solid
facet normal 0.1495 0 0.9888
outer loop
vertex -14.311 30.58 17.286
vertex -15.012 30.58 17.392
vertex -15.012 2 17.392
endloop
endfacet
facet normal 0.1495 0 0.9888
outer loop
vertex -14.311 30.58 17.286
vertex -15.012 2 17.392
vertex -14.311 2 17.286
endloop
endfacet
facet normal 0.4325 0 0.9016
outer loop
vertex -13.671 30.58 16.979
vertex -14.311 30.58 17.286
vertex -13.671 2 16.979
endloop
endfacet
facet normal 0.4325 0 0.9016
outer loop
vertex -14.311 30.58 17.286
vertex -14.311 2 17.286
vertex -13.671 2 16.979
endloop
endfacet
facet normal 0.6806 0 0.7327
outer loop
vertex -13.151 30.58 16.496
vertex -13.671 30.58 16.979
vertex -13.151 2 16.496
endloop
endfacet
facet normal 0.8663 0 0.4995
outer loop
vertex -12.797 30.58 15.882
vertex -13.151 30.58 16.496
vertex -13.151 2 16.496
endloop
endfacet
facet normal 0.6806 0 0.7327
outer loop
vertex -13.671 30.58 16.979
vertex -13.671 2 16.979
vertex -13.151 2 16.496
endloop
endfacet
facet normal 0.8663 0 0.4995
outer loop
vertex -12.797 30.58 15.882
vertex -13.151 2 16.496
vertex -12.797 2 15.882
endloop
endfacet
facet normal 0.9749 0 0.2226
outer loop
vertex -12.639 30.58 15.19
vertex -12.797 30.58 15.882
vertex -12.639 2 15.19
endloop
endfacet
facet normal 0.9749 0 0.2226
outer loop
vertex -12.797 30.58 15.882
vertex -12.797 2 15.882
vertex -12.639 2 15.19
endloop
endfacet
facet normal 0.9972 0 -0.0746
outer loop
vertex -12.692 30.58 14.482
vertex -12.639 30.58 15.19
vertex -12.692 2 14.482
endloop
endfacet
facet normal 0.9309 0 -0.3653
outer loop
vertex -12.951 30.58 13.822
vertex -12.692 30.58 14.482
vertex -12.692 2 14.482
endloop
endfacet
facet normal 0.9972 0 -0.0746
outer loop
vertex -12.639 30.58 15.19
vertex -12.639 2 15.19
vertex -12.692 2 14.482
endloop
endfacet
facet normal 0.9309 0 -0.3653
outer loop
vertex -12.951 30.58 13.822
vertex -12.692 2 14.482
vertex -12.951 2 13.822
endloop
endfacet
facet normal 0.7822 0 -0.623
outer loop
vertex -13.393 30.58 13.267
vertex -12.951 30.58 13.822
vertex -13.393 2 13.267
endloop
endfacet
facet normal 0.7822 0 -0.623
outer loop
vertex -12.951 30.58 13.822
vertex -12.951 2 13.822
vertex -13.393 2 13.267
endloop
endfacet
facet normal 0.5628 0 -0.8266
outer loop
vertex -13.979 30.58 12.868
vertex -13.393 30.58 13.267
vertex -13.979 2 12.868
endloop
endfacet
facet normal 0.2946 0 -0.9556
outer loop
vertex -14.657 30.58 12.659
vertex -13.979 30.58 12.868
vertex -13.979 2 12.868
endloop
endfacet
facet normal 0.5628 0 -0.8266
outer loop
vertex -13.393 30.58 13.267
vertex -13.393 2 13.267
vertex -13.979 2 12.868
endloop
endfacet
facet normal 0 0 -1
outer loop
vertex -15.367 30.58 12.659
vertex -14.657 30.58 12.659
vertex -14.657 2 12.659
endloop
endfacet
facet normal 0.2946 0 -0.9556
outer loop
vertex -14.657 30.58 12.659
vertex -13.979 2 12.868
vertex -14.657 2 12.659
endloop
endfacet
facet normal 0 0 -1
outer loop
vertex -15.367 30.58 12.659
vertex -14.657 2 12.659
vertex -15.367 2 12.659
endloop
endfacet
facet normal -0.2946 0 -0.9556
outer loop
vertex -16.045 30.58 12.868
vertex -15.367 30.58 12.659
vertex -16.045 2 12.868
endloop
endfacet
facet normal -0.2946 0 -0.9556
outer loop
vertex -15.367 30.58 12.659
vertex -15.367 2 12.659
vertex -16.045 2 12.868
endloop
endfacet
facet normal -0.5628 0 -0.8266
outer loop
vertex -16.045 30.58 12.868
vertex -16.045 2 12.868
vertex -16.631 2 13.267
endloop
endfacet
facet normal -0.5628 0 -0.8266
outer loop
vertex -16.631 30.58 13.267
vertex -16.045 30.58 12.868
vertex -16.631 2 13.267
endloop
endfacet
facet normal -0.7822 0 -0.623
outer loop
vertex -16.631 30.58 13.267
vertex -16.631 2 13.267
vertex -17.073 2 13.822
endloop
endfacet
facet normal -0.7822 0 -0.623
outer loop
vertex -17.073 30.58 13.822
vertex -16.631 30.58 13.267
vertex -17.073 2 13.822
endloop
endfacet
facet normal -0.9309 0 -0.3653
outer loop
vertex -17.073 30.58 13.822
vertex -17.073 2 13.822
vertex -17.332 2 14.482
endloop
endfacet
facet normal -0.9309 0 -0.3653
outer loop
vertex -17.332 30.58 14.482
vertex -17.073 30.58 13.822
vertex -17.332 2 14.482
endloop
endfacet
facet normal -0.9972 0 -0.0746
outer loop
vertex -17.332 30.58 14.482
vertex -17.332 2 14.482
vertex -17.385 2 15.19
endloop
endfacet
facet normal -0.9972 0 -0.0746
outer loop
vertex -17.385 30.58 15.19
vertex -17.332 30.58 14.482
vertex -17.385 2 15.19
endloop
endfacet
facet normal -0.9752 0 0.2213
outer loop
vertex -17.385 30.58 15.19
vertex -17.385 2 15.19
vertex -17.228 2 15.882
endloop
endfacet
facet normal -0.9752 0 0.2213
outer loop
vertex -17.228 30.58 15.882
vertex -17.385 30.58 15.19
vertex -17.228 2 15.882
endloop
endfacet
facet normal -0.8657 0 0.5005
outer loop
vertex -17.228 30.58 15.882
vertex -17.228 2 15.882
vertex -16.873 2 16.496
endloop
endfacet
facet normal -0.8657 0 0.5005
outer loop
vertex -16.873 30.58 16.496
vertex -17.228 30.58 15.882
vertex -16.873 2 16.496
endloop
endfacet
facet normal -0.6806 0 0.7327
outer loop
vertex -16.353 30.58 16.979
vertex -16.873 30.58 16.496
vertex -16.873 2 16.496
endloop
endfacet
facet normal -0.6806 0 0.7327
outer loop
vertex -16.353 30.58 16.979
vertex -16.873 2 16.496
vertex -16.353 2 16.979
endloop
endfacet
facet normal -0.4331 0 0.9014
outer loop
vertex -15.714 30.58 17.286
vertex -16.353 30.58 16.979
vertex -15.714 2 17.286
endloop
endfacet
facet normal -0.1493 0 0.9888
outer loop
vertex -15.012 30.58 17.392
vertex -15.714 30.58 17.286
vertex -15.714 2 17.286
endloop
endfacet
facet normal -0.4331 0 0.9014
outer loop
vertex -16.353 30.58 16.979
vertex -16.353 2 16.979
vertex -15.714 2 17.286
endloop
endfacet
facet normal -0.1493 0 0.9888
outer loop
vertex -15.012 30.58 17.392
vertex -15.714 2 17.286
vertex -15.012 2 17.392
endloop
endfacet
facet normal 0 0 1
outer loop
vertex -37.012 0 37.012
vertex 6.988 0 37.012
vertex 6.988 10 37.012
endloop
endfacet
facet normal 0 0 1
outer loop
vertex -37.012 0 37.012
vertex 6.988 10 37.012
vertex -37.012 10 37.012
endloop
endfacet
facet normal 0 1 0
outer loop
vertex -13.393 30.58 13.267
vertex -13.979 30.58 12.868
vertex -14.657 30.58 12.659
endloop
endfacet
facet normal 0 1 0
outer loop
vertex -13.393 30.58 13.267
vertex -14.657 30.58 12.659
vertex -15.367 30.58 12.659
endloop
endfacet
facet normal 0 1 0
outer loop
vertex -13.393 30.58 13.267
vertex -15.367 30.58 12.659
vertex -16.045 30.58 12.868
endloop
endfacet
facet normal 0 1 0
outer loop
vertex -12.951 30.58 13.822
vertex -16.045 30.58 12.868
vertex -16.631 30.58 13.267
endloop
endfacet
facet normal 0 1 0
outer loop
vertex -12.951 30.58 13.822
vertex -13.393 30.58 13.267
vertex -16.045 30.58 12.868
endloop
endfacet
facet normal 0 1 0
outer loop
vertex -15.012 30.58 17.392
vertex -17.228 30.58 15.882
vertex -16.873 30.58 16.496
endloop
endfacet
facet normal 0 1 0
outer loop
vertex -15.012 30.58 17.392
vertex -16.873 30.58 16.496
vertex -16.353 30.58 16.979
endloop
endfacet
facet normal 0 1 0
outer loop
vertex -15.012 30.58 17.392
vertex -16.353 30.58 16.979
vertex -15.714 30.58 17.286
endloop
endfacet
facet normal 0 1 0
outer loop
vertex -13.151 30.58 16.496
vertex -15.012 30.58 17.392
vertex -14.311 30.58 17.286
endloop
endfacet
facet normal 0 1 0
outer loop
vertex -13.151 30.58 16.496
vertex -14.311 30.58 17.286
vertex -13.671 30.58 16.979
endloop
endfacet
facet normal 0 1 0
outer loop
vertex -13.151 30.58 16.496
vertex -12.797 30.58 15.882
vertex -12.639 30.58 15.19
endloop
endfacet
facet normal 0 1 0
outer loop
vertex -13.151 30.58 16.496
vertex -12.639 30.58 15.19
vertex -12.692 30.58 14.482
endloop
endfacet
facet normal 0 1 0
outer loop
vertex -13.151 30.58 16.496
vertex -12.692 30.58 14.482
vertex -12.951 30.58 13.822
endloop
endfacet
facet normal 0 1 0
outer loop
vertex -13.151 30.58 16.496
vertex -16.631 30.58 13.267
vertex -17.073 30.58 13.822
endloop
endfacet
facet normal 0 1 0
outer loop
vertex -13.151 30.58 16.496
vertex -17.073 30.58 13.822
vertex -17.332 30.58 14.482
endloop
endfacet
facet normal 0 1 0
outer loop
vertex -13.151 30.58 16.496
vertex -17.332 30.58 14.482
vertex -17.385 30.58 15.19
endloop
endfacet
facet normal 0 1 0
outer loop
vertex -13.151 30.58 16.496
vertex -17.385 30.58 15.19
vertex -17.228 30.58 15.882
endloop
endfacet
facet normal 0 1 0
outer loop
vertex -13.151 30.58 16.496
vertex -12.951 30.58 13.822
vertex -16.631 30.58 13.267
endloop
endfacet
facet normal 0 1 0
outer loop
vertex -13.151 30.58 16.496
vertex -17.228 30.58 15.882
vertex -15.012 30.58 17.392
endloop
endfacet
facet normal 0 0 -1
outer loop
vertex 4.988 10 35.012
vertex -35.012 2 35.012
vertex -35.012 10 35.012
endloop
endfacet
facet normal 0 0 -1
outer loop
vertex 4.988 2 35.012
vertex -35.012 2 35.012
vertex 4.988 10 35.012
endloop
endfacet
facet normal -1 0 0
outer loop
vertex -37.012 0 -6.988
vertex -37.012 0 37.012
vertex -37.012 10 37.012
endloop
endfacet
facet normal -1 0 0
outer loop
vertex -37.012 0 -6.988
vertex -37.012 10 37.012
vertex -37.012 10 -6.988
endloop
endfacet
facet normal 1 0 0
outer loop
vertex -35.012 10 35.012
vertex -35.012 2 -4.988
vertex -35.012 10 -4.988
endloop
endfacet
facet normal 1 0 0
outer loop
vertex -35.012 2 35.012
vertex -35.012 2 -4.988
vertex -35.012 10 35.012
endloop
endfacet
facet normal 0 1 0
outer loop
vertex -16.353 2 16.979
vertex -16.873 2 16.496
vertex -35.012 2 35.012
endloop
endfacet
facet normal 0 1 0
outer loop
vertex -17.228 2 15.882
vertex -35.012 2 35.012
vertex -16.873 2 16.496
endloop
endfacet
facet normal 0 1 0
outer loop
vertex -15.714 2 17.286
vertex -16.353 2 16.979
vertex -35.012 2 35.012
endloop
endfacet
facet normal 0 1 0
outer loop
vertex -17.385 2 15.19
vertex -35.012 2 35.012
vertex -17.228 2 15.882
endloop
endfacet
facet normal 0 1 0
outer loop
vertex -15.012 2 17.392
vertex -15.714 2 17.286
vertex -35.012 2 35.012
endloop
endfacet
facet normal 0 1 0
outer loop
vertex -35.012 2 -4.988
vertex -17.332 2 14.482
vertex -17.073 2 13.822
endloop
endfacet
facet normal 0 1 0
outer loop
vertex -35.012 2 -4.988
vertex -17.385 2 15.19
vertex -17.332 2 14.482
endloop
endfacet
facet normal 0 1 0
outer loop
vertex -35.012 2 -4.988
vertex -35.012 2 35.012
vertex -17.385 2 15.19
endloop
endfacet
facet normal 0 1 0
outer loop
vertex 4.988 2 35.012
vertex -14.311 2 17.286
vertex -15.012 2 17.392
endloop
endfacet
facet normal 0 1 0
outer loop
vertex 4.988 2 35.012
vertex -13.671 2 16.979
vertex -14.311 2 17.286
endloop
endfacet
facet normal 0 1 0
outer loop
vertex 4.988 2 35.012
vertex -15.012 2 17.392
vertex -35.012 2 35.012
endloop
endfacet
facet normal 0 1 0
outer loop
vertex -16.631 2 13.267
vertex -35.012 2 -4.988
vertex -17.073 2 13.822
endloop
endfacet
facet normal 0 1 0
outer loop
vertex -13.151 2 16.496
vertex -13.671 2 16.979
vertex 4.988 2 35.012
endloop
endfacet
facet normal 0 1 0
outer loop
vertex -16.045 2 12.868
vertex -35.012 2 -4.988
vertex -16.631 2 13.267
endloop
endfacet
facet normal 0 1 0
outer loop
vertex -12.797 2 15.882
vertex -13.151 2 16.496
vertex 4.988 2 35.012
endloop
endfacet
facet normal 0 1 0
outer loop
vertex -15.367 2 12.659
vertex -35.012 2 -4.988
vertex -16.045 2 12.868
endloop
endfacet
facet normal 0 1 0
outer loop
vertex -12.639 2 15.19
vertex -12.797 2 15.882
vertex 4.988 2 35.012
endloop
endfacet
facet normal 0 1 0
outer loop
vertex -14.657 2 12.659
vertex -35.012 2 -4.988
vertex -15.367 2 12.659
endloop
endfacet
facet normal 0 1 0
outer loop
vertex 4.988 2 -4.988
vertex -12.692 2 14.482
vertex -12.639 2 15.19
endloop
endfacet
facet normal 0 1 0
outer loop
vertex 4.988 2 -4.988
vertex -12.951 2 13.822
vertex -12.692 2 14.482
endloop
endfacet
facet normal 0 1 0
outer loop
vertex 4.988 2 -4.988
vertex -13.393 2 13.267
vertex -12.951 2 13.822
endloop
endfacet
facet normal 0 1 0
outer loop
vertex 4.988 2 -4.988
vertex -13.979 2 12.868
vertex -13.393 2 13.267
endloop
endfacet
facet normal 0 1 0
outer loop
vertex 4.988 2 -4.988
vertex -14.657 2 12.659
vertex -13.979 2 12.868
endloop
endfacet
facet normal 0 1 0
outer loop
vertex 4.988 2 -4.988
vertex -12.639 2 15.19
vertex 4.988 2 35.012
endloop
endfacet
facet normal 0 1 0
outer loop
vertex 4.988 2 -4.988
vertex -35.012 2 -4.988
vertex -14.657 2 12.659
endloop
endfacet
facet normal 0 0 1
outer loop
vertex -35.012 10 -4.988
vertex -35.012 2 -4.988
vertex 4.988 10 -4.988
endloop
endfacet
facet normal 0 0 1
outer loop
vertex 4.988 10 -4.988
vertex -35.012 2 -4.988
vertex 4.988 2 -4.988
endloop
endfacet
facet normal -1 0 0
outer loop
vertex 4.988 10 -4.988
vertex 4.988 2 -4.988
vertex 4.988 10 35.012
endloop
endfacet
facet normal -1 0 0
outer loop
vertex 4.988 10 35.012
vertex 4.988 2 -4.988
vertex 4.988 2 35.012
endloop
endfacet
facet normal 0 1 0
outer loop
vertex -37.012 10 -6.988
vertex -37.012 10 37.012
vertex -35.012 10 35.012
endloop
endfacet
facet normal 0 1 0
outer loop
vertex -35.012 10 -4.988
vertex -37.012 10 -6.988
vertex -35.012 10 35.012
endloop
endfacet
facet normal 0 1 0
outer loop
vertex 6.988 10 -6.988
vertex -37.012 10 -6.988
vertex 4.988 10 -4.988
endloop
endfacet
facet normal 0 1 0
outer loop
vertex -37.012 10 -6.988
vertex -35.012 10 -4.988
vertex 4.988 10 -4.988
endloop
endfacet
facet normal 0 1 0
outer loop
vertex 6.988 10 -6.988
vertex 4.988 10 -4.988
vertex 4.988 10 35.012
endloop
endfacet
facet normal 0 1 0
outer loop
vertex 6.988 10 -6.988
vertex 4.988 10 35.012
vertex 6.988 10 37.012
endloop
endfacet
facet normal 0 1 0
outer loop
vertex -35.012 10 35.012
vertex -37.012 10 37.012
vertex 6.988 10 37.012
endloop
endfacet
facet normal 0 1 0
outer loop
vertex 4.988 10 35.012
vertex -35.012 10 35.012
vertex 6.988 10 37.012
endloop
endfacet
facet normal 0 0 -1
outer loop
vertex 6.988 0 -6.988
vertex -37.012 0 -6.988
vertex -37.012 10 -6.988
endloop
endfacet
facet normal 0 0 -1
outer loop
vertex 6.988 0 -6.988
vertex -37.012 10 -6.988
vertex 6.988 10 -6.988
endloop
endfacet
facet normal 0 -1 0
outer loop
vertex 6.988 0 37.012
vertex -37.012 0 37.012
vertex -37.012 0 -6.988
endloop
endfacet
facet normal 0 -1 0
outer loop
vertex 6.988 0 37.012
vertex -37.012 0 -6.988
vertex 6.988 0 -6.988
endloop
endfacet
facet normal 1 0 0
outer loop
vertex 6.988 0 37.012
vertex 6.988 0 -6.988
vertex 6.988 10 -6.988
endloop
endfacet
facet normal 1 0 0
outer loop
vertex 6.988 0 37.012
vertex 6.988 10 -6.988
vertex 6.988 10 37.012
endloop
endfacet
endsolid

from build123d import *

# Parameters (mm, degrees)
ESBO_O1_W                = 40
ESBO_O1_H                = 40
RESSALTO_EXTRUS_O1_DEPTH = 2
ESBO_O2_W                = 40
ESBO_O2_H                = 40
RESSALTO_EXTRUS_O2_DEPTH = 10
ESBO_O3_R                = 2.38
RESSALTO_EXTRUS_O3_DEPTH = 28.58


with BuildPart() as part:
    # Esboço1 → Ressalto-extrusão1 (new body)
    with BuildSketch(Plane(origin=(0, 0, 0), x_dir=(1, 0, 0), z_dir=(0, 1, 0))):
        with Locations((-15.012062533, -15.012062533)):
            Rectangle(ESBO_O1_W, ESBO_O1_H)
    extrude(amount=RESSALTO_EXTRUS_O1_DEPTH)

    # Esboço2 → Ressalto-extrusão2 (add)
    with BuildSketch(Plane.XZ):
        Polygon((-37.012062533, 37.012062533), (-37.012062533, 35.012062533), (-37.012062533, -6.987937467), (-35.012062533, -6.987937467), (6.987937467, -6.987937467), (6.987937467, -4.987937467), (6.987937467, 37.012062533), (4.987937467, 37.012062533), align=None)
        with Locations((-15.012062533, 15.012062533)):
            Rectangle(ESBO_O2_W, ESBO_O2_H, mode=Mode.SUBTRACT)
    extrude(amount=-RESSALTO_EXTRUS_O2_DEPTH)

    # Esboço3 → Ressalto-extrusão3 (add)
    with BuildSketch(Plane(origin=(0, 2, 0), x_dir=(1, 0, 0), z_dir=(0, 1, 0))):
        with Locations(Location((-15.012062533, -15.012062533, 0), (0, 0, 270))):
            Circle(ESBO_O3_R)
    extrude(amount=RESSALTO_EXTRUS_O3_DEPTH)


solid = part.part
